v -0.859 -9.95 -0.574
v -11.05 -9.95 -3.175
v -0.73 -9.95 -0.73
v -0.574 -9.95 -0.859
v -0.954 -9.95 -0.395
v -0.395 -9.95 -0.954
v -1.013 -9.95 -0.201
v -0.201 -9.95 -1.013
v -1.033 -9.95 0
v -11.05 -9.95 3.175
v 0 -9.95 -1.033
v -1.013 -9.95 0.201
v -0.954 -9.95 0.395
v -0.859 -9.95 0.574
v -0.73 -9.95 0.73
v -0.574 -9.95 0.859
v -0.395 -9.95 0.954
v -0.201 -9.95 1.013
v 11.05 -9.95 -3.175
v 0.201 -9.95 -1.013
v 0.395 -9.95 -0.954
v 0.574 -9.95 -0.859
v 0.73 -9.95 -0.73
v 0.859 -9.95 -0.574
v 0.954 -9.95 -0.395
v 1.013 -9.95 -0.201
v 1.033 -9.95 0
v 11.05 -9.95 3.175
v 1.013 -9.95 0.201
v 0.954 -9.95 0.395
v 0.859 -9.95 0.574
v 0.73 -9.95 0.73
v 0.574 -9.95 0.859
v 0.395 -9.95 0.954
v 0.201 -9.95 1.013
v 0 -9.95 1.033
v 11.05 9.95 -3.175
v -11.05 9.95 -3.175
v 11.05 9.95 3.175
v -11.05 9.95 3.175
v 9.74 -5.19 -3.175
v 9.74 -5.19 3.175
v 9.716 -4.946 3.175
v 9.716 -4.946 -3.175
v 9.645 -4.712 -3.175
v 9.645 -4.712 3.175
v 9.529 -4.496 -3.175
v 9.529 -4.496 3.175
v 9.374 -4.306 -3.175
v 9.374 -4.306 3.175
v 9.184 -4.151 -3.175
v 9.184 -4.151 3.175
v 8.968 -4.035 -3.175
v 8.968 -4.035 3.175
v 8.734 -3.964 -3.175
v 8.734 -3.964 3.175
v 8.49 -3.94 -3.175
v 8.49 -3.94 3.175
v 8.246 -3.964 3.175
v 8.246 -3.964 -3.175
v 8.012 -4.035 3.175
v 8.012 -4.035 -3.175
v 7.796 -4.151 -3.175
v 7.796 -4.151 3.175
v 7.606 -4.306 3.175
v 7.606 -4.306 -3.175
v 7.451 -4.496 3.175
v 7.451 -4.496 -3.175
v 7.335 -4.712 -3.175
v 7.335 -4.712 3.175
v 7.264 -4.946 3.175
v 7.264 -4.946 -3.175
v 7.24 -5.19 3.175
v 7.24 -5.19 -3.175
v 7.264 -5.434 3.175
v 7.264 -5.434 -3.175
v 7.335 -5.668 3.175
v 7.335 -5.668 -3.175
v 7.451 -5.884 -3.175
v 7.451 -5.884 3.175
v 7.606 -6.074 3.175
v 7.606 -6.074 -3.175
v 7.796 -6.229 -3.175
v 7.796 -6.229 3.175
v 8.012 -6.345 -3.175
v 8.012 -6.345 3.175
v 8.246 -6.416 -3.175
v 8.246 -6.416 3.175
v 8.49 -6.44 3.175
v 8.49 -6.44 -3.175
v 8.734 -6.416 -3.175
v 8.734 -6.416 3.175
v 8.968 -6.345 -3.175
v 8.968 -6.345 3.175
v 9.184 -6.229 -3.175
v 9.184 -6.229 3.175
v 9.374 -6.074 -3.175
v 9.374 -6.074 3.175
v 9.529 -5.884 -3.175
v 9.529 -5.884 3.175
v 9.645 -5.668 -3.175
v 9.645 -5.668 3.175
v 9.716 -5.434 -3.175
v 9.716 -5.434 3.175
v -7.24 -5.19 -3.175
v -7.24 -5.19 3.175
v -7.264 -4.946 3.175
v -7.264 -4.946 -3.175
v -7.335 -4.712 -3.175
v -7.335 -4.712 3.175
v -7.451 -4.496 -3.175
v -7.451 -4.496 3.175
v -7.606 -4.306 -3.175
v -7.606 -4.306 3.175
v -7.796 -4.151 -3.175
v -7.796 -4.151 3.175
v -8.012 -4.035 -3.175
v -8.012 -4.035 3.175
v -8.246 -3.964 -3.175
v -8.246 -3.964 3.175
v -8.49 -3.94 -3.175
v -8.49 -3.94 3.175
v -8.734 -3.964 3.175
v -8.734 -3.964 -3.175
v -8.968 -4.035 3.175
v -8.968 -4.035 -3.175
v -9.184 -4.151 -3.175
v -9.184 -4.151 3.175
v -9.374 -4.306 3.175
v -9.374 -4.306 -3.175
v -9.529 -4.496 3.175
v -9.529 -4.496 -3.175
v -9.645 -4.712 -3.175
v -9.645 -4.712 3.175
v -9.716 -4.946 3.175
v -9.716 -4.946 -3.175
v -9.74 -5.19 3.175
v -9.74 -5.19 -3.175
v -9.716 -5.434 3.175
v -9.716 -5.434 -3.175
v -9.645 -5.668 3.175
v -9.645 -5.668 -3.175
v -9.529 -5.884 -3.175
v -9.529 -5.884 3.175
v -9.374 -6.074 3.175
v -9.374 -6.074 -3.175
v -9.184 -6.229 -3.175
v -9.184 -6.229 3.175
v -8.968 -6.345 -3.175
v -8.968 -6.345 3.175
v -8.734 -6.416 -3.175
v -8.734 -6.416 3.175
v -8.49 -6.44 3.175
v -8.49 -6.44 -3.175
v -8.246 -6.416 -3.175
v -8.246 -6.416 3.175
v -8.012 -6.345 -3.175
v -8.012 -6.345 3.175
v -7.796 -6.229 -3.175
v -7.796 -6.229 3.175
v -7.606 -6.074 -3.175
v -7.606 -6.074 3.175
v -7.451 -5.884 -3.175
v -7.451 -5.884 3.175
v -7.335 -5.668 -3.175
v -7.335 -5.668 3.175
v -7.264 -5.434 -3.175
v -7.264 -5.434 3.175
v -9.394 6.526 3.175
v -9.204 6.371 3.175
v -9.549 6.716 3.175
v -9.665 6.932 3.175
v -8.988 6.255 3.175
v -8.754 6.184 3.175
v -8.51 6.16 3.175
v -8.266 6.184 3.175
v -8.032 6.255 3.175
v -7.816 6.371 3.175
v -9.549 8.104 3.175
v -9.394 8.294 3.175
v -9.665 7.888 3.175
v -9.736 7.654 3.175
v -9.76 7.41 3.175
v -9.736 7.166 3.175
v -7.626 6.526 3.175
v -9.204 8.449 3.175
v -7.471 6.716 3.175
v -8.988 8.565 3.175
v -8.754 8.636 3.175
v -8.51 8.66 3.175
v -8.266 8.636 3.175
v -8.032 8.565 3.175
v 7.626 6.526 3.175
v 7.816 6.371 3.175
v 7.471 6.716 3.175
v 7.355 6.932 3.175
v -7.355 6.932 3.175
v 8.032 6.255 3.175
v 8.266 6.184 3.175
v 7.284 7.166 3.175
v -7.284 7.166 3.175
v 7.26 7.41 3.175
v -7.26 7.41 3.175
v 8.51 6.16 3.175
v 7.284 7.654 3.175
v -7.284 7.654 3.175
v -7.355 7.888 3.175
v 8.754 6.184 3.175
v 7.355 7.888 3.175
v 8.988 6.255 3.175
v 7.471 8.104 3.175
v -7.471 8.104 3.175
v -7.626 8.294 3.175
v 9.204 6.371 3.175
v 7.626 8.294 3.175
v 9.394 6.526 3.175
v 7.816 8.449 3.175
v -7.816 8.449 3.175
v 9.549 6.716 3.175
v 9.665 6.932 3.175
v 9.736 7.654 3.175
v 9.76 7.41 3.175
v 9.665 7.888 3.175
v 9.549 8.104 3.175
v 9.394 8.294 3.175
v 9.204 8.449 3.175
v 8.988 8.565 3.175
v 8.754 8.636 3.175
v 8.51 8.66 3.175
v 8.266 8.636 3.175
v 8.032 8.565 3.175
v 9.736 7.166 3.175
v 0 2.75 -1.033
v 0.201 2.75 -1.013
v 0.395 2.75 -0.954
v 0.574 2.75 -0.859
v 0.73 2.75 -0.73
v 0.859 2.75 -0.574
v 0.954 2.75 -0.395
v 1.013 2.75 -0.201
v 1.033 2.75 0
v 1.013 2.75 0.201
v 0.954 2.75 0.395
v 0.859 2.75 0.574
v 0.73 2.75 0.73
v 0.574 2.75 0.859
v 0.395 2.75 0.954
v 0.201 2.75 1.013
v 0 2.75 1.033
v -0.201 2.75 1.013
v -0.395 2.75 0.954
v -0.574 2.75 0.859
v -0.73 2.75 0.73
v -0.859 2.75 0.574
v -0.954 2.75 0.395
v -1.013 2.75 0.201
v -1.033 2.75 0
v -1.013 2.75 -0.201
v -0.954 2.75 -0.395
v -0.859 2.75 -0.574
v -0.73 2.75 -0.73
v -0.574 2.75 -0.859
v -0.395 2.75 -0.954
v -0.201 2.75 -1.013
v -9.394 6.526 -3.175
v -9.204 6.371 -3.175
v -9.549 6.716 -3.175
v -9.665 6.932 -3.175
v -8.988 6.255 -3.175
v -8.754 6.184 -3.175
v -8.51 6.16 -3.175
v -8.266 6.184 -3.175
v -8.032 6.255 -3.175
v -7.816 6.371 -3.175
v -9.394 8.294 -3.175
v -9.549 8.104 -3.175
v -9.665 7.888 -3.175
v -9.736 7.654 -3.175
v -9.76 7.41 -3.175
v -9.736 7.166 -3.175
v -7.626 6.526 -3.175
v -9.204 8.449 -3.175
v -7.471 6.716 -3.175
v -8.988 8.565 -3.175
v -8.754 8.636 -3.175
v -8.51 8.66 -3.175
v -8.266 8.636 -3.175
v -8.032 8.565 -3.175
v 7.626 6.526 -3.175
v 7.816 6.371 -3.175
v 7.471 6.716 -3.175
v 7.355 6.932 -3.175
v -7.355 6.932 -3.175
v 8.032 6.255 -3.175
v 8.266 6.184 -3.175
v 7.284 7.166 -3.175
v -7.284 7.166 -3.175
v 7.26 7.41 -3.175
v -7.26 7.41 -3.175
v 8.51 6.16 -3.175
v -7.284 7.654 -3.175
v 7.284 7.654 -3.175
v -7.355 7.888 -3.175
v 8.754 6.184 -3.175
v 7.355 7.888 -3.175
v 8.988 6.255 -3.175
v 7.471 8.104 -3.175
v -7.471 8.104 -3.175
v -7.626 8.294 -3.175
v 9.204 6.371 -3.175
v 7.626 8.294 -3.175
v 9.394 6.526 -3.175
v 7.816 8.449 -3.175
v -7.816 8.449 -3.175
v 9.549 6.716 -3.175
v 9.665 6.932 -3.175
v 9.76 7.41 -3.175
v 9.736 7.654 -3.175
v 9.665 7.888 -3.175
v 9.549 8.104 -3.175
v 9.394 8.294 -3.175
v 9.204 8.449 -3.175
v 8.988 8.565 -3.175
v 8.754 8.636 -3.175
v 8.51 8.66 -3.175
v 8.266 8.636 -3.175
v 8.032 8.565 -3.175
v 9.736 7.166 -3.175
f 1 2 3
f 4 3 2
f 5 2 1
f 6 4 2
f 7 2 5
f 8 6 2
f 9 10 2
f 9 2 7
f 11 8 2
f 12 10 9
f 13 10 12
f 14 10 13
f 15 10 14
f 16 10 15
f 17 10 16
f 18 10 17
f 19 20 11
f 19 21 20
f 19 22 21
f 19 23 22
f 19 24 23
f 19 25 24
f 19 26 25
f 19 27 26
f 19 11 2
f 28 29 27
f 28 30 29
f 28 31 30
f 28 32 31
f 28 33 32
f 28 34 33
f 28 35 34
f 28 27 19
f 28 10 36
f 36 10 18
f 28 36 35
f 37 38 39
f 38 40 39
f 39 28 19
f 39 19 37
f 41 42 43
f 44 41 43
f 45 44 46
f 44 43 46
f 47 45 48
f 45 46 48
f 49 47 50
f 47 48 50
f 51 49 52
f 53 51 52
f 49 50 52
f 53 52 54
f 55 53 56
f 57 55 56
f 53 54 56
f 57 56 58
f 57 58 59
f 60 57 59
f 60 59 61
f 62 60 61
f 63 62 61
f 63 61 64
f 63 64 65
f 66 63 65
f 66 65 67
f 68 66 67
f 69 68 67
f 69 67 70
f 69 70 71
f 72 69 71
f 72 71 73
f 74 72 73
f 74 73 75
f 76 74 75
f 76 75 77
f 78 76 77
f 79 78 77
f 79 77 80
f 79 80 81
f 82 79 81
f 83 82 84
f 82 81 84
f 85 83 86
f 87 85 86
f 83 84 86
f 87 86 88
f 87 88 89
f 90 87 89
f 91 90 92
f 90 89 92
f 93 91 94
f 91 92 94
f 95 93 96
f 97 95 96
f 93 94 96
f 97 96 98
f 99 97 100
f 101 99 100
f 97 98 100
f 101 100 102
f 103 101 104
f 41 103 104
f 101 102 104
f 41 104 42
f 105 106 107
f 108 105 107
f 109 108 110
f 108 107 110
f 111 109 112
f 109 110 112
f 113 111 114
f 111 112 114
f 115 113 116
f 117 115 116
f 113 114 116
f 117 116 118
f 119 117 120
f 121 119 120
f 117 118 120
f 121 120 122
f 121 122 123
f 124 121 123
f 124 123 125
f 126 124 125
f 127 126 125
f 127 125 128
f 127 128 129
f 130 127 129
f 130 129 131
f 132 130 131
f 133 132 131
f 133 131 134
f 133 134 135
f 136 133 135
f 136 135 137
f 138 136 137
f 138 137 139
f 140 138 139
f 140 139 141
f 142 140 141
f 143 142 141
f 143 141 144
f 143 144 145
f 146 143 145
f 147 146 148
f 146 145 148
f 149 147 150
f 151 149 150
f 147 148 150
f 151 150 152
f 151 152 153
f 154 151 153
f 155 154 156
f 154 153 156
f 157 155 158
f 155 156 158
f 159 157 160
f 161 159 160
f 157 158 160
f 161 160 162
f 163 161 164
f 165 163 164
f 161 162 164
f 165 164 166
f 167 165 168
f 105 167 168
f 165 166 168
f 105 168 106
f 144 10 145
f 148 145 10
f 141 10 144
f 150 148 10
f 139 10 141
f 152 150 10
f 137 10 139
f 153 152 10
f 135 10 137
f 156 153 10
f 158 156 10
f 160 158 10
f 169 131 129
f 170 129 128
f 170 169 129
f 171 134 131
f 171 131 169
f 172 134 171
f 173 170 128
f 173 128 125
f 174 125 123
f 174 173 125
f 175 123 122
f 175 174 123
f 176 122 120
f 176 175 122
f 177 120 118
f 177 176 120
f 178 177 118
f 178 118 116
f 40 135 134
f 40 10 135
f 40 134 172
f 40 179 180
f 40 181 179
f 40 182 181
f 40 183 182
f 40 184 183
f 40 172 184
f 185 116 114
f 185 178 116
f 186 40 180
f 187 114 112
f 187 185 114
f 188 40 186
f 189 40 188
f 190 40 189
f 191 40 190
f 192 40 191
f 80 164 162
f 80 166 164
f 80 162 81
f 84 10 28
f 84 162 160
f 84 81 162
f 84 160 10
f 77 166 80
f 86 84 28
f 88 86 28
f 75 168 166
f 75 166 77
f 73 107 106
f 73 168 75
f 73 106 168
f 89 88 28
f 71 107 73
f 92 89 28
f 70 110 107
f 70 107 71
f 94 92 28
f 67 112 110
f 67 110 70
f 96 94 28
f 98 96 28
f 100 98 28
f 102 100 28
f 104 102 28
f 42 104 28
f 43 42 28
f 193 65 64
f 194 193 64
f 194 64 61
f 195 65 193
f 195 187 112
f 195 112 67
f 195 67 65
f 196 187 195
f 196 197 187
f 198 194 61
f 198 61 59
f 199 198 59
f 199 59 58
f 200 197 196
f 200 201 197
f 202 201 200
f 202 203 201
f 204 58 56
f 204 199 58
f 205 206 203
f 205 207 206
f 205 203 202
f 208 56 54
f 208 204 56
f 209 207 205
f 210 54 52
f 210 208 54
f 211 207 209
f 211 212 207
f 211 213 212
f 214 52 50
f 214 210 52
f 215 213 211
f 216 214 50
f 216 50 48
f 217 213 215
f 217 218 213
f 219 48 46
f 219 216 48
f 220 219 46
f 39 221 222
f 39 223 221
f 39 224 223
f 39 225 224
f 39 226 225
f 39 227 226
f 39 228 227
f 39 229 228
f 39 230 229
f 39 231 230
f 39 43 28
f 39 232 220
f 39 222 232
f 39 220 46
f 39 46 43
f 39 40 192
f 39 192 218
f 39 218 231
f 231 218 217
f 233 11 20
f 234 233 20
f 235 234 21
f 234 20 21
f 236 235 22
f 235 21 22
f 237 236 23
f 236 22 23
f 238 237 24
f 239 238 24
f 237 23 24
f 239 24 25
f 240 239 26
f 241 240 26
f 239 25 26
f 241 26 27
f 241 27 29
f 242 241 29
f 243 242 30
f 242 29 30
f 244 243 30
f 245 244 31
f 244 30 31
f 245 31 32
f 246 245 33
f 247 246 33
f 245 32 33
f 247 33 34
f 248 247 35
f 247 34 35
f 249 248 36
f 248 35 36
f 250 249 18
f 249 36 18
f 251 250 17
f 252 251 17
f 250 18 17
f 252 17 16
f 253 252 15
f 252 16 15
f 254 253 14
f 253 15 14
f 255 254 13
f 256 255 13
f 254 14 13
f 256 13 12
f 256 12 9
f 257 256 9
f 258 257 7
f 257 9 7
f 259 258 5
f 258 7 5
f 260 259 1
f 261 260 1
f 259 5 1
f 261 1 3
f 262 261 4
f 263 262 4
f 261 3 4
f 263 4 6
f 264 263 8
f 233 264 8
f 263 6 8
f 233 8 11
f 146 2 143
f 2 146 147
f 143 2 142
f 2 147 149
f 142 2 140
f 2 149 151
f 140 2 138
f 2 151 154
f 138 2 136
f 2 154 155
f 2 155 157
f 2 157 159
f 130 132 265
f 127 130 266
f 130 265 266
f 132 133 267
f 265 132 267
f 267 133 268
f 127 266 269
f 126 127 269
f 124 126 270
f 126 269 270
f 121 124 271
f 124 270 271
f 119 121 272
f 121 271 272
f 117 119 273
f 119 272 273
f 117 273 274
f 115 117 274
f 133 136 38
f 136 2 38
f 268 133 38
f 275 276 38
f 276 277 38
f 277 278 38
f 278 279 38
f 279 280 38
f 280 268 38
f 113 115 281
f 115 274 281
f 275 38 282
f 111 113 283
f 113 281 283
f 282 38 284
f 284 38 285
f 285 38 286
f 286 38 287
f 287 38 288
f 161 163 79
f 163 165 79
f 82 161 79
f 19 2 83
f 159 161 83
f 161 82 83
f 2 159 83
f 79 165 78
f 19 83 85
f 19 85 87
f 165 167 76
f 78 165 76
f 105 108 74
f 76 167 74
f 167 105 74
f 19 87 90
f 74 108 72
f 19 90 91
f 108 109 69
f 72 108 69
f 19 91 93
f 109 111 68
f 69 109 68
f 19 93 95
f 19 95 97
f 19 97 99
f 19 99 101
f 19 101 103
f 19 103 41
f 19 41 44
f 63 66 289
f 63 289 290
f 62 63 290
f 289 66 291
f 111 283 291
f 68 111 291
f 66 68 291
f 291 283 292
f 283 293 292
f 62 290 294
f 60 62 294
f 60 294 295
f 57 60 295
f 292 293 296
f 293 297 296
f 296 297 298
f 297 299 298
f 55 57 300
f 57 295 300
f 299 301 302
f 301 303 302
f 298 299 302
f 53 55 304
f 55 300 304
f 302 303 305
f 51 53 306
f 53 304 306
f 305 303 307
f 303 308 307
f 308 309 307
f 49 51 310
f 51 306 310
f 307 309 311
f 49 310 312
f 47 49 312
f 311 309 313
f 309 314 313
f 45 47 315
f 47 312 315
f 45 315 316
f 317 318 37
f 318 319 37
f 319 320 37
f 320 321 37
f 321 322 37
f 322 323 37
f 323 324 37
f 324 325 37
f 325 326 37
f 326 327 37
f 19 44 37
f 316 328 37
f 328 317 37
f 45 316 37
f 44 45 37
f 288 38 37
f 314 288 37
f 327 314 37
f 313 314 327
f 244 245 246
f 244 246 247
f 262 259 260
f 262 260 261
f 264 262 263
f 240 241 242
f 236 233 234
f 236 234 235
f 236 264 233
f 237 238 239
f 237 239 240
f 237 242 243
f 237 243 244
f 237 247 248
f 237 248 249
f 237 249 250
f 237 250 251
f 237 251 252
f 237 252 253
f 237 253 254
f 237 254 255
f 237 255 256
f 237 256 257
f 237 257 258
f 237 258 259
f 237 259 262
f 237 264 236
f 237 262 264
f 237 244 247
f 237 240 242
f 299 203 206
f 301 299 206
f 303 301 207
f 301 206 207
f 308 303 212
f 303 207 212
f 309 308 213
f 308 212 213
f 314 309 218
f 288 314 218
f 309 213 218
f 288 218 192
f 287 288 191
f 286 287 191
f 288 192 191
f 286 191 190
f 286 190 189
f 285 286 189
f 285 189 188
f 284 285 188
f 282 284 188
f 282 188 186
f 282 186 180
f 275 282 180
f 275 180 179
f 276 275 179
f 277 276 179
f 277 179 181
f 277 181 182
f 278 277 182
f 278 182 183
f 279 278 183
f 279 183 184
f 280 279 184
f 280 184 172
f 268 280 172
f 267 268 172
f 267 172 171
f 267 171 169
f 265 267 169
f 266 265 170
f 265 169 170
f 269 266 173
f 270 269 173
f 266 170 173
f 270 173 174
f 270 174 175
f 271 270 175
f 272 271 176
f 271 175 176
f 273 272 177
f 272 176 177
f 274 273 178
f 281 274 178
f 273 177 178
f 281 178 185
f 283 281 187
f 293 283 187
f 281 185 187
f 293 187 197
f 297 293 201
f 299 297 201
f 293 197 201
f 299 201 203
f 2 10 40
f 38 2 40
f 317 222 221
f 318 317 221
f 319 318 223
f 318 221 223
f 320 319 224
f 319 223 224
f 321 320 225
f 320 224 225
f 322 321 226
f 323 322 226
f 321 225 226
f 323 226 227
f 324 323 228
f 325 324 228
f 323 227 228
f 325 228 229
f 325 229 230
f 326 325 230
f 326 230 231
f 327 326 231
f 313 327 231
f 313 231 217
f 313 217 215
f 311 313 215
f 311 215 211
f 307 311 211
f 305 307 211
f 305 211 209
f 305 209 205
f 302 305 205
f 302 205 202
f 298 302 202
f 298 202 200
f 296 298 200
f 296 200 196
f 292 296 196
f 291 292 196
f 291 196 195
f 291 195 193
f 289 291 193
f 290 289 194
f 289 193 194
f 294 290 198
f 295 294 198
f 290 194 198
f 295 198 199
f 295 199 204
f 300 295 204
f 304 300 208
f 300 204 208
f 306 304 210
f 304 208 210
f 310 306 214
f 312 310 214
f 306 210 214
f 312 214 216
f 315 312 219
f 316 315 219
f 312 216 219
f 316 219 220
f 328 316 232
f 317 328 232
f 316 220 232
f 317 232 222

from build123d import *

# Parameters (mm, degrees)
SKETCH1_W          = 22.1
SKETCH1_H          = 19.9
EXTRUDE1_DEPTH     = 3.175
SKETCH2_R          = 1.03251
EXTRUDE2_DEPTH     = 12.7
SKETCH4_R          = 1.25
CUT_EXTRUDE1_DEPTH = 7.35


with BuildPart() as part:
    # Sketch1 → Extrude1 (new body, symmetric)
    with BuildSketch(Plane.XY):
        Rectangle(SKETCH1_W, SKETCH1_H)
    extrude(amount=EXTRUDE1_DEPTH, both=True)

    # Sketch2 → Extrude2 (cut)
    with BuildSketch(Plane.XZ.offset(9.95)):
        with Locations(Location((0, 0, 0), (0, 0, 270))):  # turned: the seam where the file's is
            Circle(SKETCH2_R)
    extrude(amount=-EXTRUDE2_DEPTH, mode=Mode.SUBTRACT)

    # Sketch4 → Cut-Extrude1 (cut, through all)
    with BuildSketch(Plane.XY.offset(3.175)):
        with Locations((8.49, -5.19)):
            Circle(SKETCH4_R)
        with Locations((-8.51, 7.41)):
            Circle(SKETCH4_R)
        with Locations((8.51, 7.41)):
            Circle(SKETCH4_R)
        with Locations((-8.49, -5.19)):
            Circle(SKETCH4_R)
    extrude(amount=-CUT_EXTRUDE1_DEPTH, mode=Mode.SUBTRACT)


solid = part.part
